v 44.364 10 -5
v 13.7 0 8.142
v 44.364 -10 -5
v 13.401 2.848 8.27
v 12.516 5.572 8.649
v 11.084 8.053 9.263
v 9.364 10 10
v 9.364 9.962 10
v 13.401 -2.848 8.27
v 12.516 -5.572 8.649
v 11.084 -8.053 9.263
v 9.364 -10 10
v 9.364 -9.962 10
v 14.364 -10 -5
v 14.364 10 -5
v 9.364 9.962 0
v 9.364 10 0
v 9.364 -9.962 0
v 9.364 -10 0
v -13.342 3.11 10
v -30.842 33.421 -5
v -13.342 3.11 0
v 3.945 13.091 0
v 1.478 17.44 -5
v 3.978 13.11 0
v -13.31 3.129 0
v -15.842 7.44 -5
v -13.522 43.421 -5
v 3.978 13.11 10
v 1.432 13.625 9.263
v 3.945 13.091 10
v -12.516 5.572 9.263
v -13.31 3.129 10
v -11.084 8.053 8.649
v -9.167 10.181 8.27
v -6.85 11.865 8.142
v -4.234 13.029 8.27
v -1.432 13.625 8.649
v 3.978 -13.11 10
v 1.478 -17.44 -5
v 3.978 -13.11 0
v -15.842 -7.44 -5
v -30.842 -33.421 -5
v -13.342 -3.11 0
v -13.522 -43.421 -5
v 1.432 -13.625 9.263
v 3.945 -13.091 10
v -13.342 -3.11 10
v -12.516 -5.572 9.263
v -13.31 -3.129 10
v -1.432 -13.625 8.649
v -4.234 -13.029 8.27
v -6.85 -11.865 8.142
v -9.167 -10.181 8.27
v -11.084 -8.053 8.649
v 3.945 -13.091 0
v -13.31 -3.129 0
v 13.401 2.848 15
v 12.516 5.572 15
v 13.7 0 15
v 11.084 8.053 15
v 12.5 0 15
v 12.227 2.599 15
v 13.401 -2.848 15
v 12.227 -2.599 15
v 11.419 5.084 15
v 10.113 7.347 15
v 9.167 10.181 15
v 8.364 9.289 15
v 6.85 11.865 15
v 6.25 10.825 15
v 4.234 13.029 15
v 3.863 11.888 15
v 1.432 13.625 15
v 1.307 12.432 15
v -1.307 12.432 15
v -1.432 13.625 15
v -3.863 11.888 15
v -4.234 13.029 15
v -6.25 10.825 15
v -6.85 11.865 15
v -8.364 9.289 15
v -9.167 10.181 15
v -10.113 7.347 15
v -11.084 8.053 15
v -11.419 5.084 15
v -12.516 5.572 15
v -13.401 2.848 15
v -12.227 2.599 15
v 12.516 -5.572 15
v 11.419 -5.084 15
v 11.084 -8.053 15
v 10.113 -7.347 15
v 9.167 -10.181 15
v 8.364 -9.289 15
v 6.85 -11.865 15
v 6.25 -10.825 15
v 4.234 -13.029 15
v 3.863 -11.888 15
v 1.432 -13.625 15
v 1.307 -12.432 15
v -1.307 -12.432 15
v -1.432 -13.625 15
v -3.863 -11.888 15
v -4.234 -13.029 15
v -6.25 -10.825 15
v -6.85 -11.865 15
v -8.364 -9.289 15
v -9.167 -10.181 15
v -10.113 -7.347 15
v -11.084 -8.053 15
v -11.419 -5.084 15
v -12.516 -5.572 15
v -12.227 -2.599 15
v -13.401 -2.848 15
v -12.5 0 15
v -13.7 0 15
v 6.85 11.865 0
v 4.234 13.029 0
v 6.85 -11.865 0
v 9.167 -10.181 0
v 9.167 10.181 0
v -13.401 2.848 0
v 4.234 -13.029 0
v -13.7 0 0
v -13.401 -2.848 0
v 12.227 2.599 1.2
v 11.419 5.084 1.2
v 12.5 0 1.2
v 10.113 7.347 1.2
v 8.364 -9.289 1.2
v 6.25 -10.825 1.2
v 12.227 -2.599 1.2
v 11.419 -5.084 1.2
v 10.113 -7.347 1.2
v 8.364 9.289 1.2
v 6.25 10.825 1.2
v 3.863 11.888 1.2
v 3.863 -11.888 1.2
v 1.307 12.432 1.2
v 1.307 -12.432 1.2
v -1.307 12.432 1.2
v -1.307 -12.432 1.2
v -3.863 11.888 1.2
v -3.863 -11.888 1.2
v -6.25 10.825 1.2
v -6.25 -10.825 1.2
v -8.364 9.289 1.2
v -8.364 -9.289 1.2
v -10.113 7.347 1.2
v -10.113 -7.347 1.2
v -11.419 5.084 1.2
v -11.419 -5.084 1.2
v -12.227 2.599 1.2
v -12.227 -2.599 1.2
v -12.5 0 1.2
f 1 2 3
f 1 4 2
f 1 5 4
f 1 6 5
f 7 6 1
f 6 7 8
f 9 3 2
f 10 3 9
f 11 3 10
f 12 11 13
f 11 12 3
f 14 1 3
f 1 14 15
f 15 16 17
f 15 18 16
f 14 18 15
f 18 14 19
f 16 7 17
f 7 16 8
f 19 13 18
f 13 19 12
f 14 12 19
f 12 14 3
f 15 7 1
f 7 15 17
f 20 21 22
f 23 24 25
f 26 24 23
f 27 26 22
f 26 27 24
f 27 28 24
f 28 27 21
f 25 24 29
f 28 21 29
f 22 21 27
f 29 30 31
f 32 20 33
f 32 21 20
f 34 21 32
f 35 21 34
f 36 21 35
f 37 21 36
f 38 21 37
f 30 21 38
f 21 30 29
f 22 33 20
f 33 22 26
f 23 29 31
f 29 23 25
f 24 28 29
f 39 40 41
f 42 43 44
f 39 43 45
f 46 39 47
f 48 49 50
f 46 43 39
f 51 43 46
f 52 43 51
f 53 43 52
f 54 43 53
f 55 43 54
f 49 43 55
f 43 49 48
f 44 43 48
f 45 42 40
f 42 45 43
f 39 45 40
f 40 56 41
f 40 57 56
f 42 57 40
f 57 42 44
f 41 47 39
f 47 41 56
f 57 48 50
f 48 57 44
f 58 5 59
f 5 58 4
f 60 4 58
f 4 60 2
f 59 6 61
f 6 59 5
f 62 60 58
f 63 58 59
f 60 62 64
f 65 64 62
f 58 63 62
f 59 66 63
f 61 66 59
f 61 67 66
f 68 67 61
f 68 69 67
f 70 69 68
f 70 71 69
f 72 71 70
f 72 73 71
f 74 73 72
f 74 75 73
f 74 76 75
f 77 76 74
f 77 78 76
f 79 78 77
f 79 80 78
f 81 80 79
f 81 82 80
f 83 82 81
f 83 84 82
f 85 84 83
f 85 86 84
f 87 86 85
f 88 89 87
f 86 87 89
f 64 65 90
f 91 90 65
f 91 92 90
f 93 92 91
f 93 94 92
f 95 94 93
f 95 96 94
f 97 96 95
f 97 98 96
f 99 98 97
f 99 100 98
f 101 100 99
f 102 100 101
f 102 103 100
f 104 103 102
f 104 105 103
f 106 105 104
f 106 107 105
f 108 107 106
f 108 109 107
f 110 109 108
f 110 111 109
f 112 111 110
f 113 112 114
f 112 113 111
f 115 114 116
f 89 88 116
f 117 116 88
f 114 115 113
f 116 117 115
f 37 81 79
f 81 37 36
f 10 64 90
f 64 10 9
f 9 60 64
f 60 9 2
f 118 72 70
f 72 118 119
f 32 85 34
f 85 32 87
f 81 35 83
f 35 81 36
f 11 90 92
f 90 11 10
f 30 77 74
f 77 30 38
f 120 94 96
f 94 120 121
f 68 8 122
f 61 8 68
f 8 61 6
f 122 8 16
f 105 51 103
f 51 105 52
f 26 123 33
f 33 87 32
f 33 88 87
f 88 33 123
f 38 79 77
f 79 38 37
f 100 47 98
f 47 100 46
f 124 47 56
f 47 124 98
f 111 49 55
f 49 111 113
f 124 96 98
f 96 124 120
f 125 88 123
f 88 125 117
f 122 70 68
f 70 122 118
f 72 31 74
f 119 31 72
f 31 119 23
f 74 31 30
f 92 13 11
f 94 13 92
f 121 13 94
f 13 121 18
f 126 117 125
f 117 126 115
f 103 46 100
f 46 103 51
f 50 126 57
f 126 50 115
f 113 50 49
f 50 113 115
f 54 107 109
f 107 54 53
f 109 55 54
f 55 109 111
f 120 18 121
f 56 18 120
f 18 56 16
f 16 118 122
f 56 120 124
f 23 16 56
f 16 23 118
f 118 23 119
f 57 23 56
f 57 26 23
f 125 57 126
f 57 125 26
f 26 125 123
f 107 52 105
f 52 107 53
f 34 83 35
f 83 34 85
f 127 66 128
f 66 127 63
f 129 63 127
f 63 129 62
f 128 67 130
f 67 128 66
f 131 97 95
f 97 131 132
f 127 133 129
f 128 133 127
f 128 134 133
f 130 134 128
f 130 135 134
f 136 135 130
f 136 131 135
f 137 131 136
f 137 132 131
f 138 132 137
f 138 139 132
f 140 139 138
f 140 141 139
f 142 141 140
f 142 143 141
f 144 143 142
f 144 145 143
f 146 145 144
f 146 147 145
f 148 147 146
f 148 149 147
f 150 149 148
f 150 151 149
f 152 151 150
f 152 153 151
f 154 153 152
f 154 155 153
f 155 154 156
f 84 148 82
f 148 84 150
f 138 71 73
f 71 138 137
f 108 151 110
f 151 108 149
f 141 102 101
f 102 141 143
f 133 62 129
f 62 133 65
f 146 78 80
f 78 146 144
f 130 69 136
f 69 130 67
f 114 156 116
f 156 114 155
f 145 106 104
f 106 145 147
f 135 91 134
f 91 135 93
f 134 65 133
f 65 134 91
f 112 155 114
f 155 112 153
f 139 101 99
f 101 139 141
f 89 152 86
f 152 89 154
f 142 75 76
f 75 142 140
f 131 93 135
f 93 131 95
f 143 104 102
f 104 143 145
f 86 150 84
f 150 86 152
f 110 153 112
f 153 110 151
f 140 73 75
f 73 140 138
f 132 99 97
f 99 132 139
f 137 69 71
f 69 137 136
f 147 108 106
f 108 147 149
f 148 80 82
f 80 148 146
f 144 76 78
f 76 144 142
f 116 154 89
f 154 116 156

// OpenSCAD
/*
 * Candlestick, v0.42
 *
 * by Alex Franke (CodeCreations), Feb 2014
 * http://www.theFrankes.com
 * 
 * Licenced under Creative Commons Attribution - Non-Commercial - Share Alike 3.0 
 * 
 * INSTRUCTIONS: Choose some values in the "User-defined values" section, and render. 
 * 
 * v1.00, Feb 8, 2014: Initial Release.
 */
 
/////////////////////////////////////////////////////////////////////////////
// User-defined values... 
/////////////////////////////////////////////////////////////////////////////
 
/* [Global] */

// Diameter of the candle
candleDiameter = 25;

// Height of the tube that holds the candle
height = 15;

// Thickness of the tube material 
thickness = 1.2;

// Number of candle legs
legs = 3;

// Length of candle legs
legLength = 35;

// Thickness of candle legs
legThickness = 20;

// Total height of candle legs
legHeight = 10;  

// Height of tube above the surface. 
holderHeight = 5; 

// Curve quality 
$fn=30;

/* [Hidden] */

r = candleDiameter/2 + thickness;
s = legThickness/2;  

// how far in do we move the legs so the edges meet the edge of the cylinder?
x = r - sqrt(  pow(r,2) - pow(s,2) );

/////////////////////////////////////////////////////////////////////////////
// Modules 
/////////////////////////////////////////////////////////////////////////////


difference() {
	union() {
		cylinder(h=height, r=candleDiameter/2+thickness);
		for(i=[0:legs-1]) {
			rotate([0,0,360/legs*i]) 
			translate([candleDiameter/2+thickness-x,0,0]) 
				leg();
		}
	}
	translate([0,0,thickness]) 
	cylinder(h=height, r=candleDiameter/2);
}

module leg() {
	translate([0,legThickness/2,0]) 
	rotate([90,0,0])
	linear_extrude( height=legThickness )
	polygon(points=[
		[0,0],
		[0,legHeight],
		[legLength,-holderHeight],
		[holderHeight,-holderHeight]
	]); 
}
